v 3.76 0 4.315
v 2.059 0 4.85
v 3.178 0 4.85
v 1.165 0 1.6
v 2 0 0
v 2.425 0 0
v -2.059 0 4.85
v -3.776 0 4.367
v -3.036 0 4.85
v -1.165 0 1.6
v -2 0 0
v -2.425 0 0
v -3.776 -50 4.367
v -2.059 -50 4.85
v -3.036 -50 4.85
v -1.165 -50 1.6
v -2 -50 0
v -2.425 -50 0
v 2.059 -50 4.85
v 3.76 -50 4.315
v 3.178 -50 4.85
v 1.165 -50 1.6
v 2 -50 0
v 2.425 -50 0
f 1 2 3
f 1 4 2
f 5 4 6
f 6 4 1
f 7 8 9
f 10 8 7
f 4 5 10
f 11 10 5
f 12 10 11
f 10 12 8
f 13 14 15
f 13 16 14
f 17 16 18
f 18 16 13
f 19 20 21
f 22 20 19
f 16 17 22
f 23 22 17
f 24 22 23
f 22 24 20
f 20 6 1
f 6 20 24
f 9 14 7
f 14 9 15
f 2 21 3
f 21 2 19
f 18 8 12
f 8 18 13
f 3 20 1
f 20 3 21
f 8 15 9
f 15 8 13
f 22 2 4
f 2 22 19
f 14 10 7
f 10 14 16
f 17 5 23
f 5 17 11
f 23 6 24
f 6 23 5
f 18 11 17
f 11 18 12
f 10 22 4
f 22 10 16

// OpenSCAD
// file: long_bow_tie.scad
tilt_level = 1.1;

include <include.scad>;
include <globals.scad>;

obj_leg = 12;

max_width=scaled_male_dove_max_width();
min_width=scaled_male_dove_min_width();
depth=scaled_male_dove_depth();
length = 50;

module bow_tie_master(length){
	union(){
		mirror([0,1,0])	dovetail_3d(max_width, min_width, depth, length);
		dovetail_3d(max_width, min_width, depth, length);
	}
}

module long_bow_tie(length) {
    translate([0,0,depth]) intersection(){
        rotate([90,0,0]) bow_tie_master(length);
        rotate([90,0,0]) cylinder(r=5.8, h=200);
    }
}

long_bow_tie(length);
// file: globals.scad
/*
Most things in this file is represented as one millimeter, so keep that in mind while changing things.
Some of the setting are not mm but at variables that you can set, such as 2*x=2x and you are setting what x is.
I will try to specify when things are variables and not exact measurements.
*/

// printer slop
slop = 0.15;

obj_leg = 30;
leg_length = 5.5;
small_number = 0.001;
metal_core_rode_global = 5;


///////////////// number of holes /////////////////////
z_hole_number = 8;
other_holes = 8;

///////////////// Pins /////////////////////

//pins that poke out
ball_size = 10;
pin_height = 20;
pin_diameter = 6;


//holes
hole_ball_size = ball_size;
hole_pin_height = pin_height;
hole_pin_diameter = pin_diameter;

///////////////// Z THINGS /////////////////////

berring_slot_width = 7.5;
berring_slot_depth = 6.5;
metal_core_rode = 5;

///////////////// X THINGS /////////////////////

//male dove tails
male_dove_max_width=8;
male_dove_min_width=5;
male_dove_depth=5;
male_dove_height=obj_leg/2;

function scaled_male_dove_max_width() = male_dove_max_width - slop;
function scaled_male_dove_min_width() = male_dove_min_width - slop;
function scaled_male_dove_depth() = male_dove_depth - slop;

//female dove tails, this is found on the y mounts
girl_max_width=11;
girl_min_width=5;
girl_depth=5;
girl_height=obj_leg;


///////////////// Y THINGS /////////////////////
/*
The Y is so normal that all of those global variables at the top should change all of the setting in it, this section is set her incase there are variables set in the future development of this project.
*/

// stepper
motor_side_length = 43.2;
motor_bolt_hole_distance = 31;
motor_center_hole = 23;
motor_shaft_dia = 5;
motor_shaft_hole_dia = 5+2*slop;

// bolts etc.
bolt_hole_dia = 3+2*slop;
bolt_head_hole_dia = 5.8;

m3_nut_side = 5.65;

// threaded rod
lifter_rod_diam = 9.86;
hole_threaded_rod = lifter_rod_diam+2*slop;
// file: long_bow_tie_experimental.scad
include <include.scad>;
include <globals.scad>;

use <long_bow_tie.scad>;

length = 50;

module split() {
    translate([0,0,-1]) linear_extrude(height=length+2) polygon(points=[[0,-1], [1,-1], [2.1,-5], [-2.1,-5], [-1,-1]]);
}

module long_bow_tie_split(length) {
    rotate([90,0,0]) difference() {
        translate([0,-(male_dove_depth-slop),0]) rotate([-90,0,0]) long_bow_tie(length);
        split();
        rotate([0,0,180]) split();
    }
}

long_bow_tie_split(length);
// main file
use <long_bow_tie_experimental.scad>;

union() {
    difference() {
        long_bow_tie_split(50);
        translate([0,-25, -3.5]) cube([10,51,7], center=true);
    }
    translate([0,-25, 0.8]) cube([4,50,1.6], center=true);
}
